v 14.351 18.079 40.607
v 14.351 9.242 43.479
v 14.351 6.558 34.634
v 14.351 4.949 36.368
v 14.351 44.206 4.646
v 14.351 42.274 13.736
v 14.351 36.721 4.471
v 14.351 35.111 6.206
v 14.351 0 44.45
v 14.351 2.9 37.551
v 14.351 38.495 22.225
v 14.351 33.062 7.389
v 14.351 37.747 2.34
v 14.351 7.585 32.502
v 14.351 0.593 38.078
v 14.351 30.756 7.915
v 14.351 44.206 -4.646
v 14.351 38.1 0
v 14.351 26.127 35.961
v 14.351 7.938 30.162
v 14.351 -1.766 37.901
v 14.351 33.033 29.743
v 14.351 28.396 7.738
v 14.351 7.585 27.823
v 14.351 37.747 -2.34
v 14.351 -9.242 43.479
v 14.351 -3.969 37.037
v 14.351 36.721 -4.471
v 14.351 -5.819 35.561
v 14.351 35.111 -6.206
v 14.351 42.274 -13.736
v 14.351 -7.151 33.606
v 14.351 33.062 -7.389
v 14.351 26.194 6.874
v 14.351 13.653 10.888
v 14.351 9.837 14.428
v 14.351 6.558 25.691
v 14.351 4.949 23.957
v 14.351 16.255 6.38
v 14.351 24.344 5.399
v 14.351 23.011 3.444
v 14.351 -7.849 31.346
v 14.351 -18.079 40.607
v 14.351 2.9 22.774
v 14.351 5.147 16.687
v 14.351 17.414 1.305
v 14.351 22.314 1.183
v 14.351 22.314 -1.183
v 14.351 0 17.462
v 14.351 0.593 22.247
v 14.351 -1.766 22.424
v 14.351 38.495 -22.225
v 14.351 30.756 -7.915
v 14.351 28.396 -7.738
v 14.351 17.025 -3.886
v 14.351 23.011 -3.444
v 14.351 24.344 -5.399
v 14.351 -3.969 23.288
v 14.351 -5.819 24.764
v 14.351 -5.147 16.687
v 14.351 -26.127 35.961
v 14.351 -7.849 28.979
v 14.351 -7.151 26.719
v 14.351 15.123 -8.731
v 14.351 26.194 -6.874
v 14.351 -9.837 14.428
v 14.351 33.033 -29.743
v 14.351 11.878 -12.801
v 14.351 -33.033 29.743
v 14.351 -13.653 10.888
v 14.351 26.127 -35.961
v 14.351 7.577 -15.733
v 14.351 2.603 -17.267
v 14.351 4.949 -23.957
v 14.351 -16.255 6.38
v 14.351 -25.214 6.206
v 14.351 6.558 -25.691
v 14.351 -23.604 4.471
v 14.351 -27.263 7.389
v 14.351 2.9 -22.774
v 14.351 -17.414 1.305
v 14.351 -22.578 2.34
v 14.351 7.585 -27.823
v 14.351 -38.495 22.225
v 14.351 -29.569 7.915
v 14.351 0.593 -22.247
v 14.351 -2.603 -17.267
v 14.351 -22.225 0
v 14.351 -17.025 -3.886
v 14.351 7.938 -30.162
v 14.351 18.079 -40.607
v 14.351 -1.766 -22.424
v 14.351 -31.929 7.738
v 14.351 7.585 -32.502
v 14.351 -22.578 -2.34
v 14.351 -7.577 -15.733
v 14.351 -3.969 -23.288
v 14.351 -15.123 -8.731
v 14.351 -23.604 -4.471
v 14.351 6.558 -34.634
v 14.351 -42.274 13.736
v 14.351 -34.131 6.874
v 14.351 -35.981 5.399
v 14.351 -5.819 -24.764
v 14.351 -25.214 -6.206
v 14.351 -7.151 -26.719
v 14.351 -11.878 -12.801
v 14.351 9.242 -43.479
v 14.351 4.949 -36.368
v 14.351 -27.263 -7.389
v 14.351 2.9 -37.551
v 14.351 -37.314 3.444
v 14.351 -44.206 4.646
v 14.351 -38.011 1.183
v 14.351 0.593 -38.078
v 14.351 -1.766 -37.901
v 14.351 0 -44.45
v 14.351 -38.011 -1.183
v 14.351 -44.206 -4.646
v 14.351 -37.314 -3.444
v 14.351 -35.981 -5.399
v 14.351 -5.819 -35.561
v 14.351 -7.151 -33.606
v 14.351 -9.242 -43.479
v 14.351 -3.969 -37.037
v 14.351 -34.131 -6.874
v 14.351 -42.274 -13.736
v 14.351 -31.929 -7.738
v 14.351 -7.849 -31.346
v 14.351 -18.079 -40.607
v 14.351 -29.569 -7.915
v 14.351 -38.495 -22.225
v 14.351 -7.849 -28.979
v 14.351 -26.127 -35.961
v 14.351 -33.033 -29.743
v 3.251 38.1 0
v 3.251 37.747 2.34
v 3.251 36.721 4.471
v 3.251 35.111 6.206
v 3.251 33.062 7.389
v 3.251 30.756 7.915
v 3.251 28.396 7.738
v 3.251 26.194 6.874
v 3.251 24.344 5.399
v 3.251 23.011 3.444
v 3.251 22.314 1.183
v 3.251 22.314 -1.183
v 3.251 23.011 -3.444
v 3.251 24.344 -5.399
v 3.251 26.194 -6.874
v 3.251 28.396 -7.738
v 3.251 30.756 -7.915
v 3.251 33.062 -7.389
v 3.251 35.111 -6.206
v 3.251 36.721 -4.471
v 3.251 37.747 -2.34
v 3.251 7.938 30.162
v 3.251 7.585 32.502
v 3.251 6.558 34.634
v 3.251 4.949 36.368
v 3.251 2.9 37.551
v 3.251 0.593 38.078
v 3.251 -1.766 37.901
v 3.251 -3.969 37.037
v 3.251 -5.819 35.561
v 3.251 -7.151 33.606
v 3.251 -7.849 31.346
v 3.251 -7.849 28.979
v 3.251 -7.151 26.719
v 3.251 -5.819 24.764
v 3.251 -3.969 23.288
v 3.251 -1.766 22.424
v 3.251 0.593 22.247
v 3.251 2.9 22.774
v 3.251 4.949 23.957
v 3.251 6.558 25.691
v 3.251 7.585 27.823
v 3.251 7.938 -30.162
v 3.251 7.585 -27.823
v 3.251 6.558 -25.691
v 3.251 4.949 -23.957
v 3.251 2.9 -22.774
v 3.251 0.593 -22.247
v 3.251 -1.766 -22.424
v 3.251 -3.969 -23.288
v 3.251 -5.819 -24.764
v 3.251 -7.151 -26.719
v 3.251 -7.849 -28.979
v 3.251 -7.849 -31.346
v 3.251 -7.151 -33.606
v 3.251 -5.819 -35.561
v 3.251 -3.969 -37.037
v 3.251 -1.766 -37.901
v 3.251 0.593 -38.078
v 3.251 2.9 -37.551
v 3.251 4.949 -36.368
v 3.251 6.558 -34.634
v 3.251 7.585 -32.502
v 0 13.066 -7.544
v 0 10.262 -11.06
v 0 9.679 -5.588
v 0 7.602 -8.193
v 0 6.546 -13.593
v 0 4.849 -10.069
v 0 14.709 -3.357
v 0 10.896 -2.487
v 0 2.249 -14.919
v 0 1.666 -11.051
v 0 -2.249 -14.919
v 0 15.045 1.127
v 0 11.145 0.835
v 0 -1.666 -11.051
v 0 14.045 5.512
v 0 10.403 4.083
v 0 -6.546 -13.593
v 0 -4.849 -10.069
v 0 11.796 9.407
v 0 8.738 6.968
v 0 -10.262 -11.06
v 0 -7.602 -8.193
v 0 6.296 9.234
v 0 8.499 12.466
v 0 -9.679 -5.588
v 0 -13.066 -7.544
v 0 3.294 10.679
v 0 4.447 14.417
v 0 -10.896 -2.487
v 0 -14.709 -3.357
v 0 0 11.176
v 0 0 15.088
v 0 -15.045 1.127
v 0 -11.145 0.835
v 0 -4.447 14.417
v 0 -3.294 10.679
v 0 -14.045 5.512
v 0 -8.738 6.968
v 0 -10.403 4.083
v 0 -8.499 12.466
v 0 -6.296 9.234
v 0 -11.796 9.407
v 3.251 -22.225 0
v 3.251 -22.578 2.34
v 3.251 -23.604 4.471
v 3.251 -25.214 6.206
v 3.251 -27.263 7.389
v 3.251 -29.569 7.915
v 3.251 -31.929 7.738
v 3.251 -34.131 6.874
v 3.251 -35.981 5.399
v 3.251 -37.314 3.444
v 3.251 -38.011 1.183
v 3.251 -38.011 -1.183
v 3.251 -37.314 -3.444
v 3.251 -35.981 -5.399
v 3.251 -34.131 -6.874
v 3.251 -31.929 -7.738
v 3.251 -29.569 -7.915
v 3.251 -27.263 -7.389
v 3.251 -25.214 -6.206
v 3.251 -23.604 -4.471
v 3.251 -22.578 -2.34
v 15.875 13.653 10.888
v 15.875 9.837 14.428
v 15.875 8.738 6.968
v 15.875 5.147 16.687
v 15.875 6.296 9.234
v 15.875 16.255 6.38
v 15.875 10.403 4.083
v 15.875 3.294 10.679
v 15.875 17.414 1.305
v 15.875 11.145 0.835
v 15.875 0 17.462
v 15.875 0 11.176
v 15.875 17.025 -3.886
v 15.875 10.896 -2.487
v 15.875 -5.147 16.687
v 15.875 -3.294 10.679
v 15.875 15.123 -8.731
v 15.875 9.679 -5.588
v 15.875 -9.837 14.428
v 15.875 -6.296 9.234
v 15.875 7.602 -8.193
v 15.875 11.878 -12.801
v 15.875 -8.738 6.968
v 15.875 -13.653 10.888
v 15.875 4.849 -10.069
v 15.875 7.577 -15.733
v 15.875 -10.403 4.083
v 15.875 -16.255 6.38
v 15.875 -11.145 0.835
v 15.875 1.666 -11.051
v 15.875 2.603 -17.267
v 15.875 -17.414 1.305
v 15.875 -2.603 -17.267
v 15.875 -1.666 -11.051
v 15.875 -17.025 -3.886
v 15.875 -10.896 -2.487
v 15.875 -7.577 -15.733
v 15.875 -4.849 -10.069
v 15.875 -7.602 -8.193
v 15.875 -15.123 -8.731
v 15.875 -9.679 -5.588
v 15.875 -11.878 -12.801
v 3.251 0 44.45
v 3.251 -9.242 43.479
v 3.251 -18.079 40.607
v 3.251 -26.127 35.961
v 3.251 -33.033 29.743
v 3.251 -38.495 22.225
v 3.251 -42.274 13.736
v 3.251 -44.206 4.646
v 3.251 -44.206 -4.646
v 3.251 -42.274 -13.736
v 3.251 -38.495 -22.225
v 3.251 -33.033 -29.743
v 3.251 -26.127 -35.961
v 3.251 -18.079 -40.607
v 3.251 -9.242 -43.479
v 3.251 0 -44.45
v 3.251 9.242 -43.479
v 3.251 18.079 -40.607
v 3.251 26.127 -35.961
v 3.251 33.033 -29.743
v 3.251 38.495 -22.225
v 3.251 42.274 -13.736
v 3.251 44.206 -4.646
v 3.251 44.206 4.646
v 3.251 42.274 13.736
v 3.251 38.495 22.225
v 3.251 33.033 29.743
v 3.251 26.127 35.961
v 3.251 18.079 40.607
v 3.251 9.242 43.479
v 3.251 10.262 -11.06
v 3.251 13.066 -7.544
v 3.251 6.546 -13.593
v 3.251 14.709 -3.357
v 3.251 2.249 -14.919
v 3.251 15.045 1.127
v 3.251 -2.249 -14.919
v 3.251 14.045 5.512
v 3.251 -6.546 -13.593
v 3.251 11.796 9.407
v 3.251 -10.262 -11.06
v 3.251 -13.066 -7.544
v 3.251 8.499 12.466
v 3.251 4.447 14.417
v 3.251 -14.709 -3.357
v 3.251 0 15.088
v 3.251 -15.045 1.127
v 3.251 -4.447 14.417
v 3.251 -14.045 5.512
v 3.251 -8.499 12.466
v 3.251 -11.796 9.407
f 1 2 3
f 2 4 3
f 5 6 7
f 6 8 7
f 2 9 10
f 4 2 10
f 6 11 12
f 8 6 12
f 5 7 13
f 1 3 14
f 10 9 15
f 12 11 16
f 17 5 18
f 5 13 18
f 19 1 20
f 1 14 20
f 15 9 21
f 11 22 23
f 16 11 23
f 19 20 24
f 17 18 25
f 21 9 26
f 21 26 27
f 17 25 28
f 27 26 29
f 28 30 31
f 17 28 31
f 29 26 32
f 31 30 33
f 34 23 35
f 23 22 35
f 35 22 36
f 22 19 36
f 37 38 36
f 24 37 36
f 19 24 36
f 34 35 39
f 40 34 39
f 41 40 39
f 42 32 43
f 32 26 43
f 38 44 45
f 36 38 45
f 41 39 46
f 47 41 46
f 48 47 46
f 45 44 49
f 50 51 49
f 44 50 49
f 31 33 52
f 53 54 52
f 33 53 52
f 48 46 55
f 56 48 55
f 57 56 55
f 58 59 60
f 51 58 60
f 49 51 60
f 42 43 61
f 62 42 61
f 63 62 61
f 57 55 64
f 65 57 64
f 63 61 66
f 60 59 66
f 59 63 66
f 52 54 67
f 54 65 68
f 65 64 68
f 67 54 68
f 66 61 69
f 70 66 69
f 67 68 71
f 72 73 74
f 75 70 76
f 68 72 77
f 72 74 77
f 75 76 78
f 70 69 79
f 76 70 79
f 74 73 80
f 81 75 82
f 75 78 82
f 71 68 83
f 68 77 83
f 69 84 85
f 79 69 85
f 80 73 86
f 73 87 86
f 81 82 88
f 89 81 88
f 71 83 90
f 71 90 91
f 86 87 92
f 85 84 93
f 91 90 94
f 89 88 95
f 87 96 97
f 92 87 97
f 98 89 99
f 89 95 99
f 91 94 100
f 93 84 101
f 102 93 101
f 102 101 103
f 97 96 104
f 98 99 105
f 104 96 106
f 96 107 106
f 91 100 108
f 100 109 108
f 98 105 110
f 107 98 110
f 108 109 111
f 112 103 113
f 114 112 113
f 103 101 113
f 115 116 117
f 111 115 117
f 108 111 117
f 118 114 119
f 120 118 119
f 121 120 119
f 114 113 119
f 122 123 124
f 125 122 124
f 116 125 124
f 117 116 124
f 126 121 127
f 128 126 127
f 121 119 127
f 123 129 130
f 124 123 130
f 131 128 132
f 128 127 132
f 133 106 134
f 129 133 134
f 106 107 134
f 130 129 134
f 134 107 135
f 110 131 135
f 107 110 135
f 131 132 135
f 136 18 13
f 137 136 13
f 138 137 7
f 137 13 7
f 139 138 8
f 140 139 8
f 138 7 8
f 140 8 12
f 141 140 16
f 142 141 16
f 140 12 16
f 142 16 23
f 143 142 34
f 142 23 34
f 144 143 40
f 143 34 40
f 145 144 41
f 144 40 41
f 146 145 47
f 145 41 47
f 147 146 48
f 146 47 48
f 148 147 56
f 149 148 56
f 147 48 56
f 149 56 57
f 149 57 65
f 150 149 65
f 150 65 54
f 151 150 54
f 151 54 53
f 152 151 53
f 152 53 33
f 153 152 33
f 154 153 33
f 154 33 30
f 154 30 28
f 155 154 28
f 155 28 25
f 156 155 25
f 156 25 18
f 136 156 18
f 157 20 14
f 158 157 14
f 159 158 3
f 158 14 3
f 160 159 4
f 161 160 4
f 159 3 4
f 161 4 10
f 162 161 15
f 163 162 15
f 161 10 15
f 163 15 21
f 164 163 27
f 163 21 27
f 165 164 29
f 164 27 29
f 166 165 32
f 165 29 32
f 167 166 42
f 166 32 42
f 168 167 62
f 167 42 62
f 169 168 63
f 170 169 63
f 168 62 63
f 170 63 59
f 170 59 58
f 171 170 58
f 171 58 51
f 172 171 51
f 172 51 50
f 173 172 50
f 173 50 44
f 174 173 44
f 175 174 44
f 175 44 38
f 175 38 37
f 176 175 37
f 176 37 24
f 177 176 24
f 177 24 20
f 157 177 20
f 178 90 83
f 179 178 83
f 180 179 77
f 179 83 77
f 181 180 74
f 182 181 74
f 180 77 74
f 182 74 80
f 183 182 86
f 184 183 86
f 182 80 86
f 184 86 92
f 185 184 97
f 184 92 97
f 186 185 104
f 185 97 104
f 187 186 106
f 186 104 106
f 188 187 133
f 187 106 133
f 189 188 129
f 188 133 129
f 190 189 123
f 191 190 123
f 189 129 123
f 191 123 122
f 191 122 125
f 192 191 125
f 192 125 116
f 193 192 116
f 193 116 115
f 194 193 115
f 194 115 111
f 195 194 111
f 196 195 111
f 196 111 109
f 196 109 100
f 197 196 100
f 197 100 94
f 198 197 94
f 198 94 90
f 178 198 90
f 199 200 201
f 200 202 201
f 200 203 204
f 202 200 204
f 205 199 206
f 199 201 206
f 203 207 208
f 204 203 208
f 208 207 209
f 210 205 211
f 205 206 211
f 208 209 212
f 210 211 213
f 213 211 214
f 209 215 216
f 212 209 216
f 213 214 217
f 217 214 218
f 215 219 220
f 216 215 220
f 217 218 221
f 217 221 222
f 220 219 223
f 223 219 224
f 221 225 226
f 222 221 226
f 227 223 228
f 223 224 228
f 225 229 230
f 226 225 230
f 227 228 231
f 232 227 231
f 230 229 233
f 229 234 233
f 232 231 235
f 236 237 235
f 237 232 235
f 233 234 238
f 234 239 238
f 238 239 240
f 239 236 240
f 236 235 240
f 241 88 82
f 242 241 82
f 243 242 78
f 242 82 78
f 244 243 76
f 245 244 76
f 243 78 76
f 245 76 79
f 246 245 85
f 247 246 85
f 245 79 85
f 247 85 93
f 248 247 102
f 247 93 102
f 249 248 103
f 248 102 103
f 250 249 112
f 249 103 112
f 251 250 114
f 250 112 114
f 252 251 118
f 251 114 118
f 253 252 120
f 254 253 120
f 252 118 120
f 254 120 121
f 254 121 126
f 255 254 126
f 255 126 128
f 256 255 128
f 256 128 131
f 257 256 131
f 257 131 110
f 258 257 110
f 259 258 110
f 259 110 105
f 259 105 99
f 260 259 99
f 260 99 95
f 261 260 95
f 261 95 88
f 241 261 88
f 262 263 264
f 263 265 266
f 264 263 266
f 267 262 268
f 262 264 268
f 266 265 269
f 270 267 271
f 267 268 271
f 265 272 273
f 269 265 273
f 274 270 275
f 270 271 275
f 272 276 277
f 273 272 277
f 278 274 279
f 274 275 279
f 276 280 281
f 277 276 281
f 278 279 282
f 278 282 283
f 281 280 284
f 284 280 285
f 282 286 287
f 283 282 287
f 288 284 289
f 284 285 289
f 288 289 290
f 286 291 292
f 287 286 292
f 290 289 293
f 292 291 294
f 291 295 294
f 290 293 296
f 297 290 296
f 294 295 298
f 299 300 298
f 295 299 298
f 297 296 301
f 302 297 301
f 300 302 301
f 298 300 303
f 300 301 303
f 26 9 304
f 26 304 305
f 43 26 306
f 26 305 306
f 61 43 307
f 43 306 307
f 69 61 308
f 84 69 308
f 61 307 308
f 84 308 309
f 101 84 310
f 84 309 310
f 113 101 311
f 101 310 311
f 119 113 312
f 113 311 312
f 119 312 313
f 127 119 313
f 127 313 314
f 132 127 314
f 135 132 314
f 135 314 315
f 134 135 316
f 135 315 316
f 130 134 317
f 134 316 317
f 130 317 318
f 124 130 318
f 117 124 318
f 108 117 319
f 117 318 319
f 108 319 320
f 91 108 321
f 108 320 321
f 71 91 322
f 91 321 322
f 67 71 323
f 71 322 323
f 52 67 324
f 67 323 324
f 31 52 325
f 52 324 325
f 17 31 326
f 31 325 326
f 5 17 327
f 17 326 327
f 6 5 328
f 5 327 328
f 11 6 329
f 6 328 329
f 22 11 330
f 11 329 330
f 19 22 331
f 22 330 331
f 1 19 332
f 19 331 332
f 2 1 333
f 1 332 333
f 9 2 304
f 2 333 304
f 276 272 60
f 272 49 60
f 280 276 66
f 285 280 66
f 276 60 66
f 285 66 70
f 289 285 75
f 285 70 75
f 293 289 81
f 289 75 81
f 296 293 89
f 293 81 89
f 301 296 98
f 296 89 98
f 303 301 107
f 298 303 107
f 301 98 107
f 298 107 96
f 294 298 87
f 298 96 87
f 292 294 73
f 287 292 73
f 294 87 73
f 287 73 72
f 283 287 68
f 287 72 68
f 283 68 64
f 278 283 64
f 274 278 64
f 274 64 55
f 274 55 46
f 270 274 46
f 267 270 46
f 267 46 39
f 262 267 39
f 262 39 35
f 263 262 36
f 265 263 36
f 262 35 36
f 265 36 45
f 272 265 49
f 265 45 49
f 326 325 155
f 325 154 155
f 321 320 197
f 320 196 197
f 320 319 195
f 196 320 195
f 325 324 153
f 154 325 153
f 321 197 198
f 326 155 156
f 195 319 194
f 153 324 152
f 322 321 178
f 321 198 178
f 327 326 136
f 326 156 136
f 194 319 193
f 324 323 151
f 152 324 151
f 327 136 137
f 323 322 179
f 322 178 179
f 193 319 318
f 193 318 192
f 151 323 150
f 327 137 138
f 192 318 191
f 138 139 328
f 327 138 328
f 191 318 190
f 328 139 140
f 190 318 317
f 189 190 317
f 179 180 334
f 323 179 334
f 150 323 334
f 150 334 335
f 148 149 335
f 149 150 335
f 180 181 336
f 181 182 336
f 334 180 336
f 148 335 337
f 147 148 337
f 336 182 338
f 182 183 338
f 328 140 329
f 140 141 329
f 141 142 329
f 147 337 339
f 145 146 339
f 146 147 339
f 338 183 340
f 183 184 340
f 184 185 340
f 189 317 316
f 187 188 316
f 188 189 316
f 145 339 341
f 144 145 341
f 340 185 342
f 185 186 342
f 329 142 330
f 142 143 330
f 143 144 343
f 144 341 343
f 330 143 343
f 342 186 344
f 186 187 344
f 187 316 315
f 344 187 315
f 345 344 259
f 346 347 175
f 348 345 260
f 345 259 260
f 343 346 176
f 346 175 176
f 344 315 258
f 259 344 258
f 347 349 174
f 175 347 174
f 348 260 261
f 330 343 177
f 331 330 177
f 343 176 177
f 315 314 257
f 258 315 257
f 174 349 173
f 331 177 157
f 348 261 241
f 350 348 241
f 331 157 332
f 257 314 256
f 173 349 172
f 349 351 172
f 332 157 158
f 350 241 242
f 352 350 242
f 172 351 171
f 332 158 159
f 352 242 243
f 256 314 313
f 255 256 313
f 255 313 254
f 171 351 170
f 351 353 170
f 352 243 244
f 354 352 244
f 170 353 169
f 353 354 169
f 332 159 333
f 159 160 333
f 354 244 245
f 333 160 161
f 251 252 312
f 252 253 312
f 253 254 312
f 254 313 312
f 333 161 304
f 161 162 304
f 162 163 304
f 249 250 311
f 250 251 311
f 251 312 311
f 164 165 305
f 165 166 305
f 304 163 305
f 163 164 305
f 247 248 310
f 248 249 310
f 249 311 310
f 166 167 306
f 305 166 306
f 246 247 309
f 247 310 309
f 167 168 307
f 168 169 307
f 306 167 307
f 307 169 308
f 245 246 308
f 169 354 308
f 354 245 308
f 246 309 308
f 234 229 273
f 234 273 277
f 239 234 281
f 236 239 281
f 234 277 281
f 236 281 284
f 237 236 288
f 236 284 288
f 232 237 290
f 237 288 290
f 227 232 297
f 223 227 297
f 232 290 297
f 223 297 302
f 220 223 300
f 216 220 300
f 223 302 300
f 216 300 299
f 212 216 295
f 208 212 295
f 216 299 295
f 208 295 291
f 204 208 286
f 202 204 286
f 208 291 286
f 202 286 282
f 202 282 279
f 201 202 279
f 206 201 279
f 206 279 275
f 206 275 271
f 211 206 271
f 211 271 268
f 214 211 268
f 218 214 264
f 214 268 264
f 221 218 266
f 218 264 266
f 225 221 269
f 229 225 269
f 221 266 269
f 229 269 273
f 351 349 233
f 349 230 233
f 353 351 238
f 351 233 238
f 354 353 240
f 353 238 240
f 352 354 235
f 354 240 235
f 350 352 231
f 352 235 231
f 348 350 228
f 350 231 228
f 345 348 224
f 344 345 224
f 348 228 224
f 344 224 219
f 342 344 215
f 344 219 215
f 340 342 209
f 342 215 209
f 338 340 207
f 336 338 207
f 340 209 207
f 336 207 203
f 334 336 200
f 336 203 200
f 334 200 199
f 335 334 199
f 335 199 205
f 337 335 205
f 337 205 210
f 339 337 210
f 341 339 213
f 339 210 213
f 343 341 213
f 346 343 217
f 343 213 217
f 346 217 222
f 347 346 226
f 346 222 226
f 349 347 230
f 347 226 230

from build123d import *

# Parameters (mm, degrees)
F2_R     = 7.9375
F3_DEPTH = 14.352


with BuildPart() as f1:
    # F0 (on Front) → F1 (revolve)
    with BuildSketch(Plane.XZ):
        Polygon((0, 15.0876), (0, 11.176), (15.875, 11.176), (15.875, 17.4625), (14.351, 17.4625), (14.351, 44.45), (3.2512, 44.45), (3.2512, 15.0876), align=None)
    revolve(axis=Axis((0.385378, 0, 0), (1, 0, 0)))

    # F2 (on face) → F3 (cut, through all)
    with BuildSketch(Plane.YZ.offset(14.351)):
        with Locations((0, 30.1625)):
            Circle(F2_R)
        with Locations((0, -30.1625)):
            Circle(F2_R)
        with Locations((-30.1625, 0)):
            Circle(F2_R)
        with Locations((30.1625, 0)):
            Circle(F2_R)
    extrude(amount=-F3_DEPTH, mode=Mode.SUBTRACT)


solid = f1.part
